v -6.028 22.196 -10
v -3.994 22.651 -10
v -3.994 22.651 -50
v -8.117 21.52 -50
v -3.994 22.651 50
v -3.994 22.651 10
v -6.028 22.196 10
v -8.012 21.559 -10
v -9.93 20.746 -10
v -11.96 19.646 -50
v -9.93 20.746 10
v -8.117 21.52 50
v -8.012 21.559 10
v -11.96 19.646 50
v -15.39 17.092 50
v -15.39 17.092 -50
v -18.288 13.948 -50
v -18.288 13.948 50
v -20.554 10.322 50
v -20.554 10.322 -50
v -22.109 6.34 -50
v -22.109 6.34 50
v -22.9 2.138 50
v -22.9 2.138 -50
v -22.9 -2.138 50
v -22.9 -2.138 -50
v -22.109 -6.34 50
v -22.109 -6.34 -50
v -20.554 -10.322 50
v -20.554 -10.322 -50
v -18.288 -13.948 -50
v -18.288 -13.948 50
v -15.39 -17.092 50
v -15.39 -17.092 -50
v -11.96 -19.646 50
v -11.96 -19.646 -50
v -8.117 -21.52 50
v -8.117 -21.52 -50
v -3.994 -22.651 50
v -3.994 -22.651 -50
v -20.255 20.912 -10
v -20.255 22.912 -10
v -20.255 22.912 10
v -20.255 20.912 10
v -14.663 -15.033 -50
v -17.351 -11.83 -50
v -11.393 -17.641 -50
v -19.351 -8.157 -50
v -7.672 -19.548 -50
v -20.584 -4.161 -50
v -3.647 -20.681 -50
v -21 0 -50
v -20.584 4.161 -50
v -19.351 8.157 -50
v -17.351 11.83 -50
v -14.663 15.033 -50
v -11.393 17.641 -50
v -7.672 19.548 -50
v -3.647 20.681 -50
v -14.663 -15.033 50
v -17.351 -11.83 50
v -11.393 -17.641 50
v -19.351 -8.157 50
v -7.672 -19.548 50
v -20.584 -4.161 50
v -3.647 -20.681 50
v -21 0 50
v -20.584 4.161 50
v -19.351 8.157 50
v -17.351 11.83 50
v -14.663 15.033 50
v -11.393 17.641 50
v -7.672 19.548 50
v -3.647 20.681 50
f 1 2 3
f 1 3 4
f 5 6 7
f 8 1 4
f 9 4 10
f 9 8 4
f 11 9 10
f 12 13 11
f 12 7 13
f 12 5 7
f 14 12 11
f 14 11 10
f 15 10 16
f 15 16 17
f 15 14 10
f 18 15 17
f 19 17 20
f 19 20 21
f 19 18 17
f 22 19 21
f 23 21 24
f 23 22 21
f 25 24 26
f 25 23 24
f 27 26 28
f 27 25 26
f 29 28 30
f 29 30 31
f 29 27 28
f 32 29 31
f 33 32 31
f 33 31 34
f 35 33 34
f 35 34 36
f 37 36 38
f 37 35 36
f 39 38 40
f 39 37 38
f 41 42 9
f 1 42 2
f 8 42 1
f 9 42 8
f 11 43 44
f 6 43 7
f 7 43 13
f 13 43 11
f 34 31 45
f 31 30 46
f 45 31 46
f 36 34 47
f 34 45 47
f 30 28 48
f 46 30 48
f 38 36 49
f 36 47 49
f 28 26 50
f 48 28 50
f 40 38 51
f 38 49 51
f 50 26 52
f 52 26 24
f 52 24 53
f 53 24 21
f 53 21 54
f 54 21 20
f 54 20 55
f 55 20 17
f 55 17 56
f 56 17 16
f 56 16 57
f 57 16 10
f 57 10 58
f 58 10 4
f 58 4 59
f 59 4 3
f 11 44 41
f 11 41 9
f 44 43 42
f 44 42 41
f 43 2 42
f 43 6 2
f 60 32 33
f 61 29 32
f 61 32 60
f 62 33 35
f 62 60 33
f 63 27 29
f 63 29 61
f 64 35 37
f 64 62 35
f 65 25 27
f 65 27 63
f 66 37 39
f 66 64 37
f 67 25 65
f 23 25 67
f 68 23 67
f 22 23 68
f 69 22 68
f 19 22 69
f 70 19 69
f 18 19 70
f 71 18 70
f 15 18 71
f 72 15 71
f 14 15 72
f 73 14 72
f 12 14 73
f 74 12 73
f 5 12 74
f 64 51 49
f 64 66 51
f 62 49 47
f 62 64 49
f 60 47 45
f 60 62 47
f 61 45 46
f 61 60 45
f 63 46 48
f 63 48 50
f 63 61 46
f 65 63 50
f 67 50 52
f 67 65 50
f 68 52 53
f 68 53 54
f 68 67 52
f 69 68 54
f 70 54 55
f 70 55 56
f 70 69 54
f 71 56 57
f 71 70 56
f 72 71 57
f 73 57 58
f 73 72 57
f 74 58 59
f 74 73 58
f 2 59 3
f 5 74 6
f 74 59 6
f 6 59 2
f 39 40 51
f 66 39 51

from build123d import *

# Parameters (mm, degrees)
EXTRUDE_1_DEPTH = 50
EXTRUDE_2_DEPTH = 10


with BuildPart() as part:
    # 草图1 → 凸台-拉伸1 (new, symmetric)
    with BuildSketch(Plane.XY):
        with BuildLine():
            Line((-3.646611731, 20.680962813), (-3.993908086, 22.650578319))
            ThreePointArc((-3.993908086, 22.650578319), (-23, 0), (-3.993908086, -22.650578319))
            Line((-3.993908086, -22.650578319), (-3.646611731, -20.680962813))
            ThreePointArc((-3.646611731, -20.680962813), (-21, 0), (-3.646611731, 20.680962813))
        make_face()
    extrude(amount=EXTRUDE_1_DEPTH, both=True)

    # 草图2 → 凸台-拉伸2 (add, symmetric)
    with BuildSketch(Plane.XY):
        with BuildLine():
            Line((-3.993908086, 22.650578319), (-20.254671357, 22.911623668))
            Line((-20.254671357, 22.911623668), (-20.254671357, 20.911623668))
            Line((-20.254671357, 20.911623668), (-9.930184633, 20.745877498))
            ThreePointArc((-9.930184633, 20.745877498), (-7.026881301, 21.900295413), (-3.993908086, 22.650578319))
        make_face()
    extrude(amount=EXTRUDE_2_DEPTH, both=True)


solid = part.part
